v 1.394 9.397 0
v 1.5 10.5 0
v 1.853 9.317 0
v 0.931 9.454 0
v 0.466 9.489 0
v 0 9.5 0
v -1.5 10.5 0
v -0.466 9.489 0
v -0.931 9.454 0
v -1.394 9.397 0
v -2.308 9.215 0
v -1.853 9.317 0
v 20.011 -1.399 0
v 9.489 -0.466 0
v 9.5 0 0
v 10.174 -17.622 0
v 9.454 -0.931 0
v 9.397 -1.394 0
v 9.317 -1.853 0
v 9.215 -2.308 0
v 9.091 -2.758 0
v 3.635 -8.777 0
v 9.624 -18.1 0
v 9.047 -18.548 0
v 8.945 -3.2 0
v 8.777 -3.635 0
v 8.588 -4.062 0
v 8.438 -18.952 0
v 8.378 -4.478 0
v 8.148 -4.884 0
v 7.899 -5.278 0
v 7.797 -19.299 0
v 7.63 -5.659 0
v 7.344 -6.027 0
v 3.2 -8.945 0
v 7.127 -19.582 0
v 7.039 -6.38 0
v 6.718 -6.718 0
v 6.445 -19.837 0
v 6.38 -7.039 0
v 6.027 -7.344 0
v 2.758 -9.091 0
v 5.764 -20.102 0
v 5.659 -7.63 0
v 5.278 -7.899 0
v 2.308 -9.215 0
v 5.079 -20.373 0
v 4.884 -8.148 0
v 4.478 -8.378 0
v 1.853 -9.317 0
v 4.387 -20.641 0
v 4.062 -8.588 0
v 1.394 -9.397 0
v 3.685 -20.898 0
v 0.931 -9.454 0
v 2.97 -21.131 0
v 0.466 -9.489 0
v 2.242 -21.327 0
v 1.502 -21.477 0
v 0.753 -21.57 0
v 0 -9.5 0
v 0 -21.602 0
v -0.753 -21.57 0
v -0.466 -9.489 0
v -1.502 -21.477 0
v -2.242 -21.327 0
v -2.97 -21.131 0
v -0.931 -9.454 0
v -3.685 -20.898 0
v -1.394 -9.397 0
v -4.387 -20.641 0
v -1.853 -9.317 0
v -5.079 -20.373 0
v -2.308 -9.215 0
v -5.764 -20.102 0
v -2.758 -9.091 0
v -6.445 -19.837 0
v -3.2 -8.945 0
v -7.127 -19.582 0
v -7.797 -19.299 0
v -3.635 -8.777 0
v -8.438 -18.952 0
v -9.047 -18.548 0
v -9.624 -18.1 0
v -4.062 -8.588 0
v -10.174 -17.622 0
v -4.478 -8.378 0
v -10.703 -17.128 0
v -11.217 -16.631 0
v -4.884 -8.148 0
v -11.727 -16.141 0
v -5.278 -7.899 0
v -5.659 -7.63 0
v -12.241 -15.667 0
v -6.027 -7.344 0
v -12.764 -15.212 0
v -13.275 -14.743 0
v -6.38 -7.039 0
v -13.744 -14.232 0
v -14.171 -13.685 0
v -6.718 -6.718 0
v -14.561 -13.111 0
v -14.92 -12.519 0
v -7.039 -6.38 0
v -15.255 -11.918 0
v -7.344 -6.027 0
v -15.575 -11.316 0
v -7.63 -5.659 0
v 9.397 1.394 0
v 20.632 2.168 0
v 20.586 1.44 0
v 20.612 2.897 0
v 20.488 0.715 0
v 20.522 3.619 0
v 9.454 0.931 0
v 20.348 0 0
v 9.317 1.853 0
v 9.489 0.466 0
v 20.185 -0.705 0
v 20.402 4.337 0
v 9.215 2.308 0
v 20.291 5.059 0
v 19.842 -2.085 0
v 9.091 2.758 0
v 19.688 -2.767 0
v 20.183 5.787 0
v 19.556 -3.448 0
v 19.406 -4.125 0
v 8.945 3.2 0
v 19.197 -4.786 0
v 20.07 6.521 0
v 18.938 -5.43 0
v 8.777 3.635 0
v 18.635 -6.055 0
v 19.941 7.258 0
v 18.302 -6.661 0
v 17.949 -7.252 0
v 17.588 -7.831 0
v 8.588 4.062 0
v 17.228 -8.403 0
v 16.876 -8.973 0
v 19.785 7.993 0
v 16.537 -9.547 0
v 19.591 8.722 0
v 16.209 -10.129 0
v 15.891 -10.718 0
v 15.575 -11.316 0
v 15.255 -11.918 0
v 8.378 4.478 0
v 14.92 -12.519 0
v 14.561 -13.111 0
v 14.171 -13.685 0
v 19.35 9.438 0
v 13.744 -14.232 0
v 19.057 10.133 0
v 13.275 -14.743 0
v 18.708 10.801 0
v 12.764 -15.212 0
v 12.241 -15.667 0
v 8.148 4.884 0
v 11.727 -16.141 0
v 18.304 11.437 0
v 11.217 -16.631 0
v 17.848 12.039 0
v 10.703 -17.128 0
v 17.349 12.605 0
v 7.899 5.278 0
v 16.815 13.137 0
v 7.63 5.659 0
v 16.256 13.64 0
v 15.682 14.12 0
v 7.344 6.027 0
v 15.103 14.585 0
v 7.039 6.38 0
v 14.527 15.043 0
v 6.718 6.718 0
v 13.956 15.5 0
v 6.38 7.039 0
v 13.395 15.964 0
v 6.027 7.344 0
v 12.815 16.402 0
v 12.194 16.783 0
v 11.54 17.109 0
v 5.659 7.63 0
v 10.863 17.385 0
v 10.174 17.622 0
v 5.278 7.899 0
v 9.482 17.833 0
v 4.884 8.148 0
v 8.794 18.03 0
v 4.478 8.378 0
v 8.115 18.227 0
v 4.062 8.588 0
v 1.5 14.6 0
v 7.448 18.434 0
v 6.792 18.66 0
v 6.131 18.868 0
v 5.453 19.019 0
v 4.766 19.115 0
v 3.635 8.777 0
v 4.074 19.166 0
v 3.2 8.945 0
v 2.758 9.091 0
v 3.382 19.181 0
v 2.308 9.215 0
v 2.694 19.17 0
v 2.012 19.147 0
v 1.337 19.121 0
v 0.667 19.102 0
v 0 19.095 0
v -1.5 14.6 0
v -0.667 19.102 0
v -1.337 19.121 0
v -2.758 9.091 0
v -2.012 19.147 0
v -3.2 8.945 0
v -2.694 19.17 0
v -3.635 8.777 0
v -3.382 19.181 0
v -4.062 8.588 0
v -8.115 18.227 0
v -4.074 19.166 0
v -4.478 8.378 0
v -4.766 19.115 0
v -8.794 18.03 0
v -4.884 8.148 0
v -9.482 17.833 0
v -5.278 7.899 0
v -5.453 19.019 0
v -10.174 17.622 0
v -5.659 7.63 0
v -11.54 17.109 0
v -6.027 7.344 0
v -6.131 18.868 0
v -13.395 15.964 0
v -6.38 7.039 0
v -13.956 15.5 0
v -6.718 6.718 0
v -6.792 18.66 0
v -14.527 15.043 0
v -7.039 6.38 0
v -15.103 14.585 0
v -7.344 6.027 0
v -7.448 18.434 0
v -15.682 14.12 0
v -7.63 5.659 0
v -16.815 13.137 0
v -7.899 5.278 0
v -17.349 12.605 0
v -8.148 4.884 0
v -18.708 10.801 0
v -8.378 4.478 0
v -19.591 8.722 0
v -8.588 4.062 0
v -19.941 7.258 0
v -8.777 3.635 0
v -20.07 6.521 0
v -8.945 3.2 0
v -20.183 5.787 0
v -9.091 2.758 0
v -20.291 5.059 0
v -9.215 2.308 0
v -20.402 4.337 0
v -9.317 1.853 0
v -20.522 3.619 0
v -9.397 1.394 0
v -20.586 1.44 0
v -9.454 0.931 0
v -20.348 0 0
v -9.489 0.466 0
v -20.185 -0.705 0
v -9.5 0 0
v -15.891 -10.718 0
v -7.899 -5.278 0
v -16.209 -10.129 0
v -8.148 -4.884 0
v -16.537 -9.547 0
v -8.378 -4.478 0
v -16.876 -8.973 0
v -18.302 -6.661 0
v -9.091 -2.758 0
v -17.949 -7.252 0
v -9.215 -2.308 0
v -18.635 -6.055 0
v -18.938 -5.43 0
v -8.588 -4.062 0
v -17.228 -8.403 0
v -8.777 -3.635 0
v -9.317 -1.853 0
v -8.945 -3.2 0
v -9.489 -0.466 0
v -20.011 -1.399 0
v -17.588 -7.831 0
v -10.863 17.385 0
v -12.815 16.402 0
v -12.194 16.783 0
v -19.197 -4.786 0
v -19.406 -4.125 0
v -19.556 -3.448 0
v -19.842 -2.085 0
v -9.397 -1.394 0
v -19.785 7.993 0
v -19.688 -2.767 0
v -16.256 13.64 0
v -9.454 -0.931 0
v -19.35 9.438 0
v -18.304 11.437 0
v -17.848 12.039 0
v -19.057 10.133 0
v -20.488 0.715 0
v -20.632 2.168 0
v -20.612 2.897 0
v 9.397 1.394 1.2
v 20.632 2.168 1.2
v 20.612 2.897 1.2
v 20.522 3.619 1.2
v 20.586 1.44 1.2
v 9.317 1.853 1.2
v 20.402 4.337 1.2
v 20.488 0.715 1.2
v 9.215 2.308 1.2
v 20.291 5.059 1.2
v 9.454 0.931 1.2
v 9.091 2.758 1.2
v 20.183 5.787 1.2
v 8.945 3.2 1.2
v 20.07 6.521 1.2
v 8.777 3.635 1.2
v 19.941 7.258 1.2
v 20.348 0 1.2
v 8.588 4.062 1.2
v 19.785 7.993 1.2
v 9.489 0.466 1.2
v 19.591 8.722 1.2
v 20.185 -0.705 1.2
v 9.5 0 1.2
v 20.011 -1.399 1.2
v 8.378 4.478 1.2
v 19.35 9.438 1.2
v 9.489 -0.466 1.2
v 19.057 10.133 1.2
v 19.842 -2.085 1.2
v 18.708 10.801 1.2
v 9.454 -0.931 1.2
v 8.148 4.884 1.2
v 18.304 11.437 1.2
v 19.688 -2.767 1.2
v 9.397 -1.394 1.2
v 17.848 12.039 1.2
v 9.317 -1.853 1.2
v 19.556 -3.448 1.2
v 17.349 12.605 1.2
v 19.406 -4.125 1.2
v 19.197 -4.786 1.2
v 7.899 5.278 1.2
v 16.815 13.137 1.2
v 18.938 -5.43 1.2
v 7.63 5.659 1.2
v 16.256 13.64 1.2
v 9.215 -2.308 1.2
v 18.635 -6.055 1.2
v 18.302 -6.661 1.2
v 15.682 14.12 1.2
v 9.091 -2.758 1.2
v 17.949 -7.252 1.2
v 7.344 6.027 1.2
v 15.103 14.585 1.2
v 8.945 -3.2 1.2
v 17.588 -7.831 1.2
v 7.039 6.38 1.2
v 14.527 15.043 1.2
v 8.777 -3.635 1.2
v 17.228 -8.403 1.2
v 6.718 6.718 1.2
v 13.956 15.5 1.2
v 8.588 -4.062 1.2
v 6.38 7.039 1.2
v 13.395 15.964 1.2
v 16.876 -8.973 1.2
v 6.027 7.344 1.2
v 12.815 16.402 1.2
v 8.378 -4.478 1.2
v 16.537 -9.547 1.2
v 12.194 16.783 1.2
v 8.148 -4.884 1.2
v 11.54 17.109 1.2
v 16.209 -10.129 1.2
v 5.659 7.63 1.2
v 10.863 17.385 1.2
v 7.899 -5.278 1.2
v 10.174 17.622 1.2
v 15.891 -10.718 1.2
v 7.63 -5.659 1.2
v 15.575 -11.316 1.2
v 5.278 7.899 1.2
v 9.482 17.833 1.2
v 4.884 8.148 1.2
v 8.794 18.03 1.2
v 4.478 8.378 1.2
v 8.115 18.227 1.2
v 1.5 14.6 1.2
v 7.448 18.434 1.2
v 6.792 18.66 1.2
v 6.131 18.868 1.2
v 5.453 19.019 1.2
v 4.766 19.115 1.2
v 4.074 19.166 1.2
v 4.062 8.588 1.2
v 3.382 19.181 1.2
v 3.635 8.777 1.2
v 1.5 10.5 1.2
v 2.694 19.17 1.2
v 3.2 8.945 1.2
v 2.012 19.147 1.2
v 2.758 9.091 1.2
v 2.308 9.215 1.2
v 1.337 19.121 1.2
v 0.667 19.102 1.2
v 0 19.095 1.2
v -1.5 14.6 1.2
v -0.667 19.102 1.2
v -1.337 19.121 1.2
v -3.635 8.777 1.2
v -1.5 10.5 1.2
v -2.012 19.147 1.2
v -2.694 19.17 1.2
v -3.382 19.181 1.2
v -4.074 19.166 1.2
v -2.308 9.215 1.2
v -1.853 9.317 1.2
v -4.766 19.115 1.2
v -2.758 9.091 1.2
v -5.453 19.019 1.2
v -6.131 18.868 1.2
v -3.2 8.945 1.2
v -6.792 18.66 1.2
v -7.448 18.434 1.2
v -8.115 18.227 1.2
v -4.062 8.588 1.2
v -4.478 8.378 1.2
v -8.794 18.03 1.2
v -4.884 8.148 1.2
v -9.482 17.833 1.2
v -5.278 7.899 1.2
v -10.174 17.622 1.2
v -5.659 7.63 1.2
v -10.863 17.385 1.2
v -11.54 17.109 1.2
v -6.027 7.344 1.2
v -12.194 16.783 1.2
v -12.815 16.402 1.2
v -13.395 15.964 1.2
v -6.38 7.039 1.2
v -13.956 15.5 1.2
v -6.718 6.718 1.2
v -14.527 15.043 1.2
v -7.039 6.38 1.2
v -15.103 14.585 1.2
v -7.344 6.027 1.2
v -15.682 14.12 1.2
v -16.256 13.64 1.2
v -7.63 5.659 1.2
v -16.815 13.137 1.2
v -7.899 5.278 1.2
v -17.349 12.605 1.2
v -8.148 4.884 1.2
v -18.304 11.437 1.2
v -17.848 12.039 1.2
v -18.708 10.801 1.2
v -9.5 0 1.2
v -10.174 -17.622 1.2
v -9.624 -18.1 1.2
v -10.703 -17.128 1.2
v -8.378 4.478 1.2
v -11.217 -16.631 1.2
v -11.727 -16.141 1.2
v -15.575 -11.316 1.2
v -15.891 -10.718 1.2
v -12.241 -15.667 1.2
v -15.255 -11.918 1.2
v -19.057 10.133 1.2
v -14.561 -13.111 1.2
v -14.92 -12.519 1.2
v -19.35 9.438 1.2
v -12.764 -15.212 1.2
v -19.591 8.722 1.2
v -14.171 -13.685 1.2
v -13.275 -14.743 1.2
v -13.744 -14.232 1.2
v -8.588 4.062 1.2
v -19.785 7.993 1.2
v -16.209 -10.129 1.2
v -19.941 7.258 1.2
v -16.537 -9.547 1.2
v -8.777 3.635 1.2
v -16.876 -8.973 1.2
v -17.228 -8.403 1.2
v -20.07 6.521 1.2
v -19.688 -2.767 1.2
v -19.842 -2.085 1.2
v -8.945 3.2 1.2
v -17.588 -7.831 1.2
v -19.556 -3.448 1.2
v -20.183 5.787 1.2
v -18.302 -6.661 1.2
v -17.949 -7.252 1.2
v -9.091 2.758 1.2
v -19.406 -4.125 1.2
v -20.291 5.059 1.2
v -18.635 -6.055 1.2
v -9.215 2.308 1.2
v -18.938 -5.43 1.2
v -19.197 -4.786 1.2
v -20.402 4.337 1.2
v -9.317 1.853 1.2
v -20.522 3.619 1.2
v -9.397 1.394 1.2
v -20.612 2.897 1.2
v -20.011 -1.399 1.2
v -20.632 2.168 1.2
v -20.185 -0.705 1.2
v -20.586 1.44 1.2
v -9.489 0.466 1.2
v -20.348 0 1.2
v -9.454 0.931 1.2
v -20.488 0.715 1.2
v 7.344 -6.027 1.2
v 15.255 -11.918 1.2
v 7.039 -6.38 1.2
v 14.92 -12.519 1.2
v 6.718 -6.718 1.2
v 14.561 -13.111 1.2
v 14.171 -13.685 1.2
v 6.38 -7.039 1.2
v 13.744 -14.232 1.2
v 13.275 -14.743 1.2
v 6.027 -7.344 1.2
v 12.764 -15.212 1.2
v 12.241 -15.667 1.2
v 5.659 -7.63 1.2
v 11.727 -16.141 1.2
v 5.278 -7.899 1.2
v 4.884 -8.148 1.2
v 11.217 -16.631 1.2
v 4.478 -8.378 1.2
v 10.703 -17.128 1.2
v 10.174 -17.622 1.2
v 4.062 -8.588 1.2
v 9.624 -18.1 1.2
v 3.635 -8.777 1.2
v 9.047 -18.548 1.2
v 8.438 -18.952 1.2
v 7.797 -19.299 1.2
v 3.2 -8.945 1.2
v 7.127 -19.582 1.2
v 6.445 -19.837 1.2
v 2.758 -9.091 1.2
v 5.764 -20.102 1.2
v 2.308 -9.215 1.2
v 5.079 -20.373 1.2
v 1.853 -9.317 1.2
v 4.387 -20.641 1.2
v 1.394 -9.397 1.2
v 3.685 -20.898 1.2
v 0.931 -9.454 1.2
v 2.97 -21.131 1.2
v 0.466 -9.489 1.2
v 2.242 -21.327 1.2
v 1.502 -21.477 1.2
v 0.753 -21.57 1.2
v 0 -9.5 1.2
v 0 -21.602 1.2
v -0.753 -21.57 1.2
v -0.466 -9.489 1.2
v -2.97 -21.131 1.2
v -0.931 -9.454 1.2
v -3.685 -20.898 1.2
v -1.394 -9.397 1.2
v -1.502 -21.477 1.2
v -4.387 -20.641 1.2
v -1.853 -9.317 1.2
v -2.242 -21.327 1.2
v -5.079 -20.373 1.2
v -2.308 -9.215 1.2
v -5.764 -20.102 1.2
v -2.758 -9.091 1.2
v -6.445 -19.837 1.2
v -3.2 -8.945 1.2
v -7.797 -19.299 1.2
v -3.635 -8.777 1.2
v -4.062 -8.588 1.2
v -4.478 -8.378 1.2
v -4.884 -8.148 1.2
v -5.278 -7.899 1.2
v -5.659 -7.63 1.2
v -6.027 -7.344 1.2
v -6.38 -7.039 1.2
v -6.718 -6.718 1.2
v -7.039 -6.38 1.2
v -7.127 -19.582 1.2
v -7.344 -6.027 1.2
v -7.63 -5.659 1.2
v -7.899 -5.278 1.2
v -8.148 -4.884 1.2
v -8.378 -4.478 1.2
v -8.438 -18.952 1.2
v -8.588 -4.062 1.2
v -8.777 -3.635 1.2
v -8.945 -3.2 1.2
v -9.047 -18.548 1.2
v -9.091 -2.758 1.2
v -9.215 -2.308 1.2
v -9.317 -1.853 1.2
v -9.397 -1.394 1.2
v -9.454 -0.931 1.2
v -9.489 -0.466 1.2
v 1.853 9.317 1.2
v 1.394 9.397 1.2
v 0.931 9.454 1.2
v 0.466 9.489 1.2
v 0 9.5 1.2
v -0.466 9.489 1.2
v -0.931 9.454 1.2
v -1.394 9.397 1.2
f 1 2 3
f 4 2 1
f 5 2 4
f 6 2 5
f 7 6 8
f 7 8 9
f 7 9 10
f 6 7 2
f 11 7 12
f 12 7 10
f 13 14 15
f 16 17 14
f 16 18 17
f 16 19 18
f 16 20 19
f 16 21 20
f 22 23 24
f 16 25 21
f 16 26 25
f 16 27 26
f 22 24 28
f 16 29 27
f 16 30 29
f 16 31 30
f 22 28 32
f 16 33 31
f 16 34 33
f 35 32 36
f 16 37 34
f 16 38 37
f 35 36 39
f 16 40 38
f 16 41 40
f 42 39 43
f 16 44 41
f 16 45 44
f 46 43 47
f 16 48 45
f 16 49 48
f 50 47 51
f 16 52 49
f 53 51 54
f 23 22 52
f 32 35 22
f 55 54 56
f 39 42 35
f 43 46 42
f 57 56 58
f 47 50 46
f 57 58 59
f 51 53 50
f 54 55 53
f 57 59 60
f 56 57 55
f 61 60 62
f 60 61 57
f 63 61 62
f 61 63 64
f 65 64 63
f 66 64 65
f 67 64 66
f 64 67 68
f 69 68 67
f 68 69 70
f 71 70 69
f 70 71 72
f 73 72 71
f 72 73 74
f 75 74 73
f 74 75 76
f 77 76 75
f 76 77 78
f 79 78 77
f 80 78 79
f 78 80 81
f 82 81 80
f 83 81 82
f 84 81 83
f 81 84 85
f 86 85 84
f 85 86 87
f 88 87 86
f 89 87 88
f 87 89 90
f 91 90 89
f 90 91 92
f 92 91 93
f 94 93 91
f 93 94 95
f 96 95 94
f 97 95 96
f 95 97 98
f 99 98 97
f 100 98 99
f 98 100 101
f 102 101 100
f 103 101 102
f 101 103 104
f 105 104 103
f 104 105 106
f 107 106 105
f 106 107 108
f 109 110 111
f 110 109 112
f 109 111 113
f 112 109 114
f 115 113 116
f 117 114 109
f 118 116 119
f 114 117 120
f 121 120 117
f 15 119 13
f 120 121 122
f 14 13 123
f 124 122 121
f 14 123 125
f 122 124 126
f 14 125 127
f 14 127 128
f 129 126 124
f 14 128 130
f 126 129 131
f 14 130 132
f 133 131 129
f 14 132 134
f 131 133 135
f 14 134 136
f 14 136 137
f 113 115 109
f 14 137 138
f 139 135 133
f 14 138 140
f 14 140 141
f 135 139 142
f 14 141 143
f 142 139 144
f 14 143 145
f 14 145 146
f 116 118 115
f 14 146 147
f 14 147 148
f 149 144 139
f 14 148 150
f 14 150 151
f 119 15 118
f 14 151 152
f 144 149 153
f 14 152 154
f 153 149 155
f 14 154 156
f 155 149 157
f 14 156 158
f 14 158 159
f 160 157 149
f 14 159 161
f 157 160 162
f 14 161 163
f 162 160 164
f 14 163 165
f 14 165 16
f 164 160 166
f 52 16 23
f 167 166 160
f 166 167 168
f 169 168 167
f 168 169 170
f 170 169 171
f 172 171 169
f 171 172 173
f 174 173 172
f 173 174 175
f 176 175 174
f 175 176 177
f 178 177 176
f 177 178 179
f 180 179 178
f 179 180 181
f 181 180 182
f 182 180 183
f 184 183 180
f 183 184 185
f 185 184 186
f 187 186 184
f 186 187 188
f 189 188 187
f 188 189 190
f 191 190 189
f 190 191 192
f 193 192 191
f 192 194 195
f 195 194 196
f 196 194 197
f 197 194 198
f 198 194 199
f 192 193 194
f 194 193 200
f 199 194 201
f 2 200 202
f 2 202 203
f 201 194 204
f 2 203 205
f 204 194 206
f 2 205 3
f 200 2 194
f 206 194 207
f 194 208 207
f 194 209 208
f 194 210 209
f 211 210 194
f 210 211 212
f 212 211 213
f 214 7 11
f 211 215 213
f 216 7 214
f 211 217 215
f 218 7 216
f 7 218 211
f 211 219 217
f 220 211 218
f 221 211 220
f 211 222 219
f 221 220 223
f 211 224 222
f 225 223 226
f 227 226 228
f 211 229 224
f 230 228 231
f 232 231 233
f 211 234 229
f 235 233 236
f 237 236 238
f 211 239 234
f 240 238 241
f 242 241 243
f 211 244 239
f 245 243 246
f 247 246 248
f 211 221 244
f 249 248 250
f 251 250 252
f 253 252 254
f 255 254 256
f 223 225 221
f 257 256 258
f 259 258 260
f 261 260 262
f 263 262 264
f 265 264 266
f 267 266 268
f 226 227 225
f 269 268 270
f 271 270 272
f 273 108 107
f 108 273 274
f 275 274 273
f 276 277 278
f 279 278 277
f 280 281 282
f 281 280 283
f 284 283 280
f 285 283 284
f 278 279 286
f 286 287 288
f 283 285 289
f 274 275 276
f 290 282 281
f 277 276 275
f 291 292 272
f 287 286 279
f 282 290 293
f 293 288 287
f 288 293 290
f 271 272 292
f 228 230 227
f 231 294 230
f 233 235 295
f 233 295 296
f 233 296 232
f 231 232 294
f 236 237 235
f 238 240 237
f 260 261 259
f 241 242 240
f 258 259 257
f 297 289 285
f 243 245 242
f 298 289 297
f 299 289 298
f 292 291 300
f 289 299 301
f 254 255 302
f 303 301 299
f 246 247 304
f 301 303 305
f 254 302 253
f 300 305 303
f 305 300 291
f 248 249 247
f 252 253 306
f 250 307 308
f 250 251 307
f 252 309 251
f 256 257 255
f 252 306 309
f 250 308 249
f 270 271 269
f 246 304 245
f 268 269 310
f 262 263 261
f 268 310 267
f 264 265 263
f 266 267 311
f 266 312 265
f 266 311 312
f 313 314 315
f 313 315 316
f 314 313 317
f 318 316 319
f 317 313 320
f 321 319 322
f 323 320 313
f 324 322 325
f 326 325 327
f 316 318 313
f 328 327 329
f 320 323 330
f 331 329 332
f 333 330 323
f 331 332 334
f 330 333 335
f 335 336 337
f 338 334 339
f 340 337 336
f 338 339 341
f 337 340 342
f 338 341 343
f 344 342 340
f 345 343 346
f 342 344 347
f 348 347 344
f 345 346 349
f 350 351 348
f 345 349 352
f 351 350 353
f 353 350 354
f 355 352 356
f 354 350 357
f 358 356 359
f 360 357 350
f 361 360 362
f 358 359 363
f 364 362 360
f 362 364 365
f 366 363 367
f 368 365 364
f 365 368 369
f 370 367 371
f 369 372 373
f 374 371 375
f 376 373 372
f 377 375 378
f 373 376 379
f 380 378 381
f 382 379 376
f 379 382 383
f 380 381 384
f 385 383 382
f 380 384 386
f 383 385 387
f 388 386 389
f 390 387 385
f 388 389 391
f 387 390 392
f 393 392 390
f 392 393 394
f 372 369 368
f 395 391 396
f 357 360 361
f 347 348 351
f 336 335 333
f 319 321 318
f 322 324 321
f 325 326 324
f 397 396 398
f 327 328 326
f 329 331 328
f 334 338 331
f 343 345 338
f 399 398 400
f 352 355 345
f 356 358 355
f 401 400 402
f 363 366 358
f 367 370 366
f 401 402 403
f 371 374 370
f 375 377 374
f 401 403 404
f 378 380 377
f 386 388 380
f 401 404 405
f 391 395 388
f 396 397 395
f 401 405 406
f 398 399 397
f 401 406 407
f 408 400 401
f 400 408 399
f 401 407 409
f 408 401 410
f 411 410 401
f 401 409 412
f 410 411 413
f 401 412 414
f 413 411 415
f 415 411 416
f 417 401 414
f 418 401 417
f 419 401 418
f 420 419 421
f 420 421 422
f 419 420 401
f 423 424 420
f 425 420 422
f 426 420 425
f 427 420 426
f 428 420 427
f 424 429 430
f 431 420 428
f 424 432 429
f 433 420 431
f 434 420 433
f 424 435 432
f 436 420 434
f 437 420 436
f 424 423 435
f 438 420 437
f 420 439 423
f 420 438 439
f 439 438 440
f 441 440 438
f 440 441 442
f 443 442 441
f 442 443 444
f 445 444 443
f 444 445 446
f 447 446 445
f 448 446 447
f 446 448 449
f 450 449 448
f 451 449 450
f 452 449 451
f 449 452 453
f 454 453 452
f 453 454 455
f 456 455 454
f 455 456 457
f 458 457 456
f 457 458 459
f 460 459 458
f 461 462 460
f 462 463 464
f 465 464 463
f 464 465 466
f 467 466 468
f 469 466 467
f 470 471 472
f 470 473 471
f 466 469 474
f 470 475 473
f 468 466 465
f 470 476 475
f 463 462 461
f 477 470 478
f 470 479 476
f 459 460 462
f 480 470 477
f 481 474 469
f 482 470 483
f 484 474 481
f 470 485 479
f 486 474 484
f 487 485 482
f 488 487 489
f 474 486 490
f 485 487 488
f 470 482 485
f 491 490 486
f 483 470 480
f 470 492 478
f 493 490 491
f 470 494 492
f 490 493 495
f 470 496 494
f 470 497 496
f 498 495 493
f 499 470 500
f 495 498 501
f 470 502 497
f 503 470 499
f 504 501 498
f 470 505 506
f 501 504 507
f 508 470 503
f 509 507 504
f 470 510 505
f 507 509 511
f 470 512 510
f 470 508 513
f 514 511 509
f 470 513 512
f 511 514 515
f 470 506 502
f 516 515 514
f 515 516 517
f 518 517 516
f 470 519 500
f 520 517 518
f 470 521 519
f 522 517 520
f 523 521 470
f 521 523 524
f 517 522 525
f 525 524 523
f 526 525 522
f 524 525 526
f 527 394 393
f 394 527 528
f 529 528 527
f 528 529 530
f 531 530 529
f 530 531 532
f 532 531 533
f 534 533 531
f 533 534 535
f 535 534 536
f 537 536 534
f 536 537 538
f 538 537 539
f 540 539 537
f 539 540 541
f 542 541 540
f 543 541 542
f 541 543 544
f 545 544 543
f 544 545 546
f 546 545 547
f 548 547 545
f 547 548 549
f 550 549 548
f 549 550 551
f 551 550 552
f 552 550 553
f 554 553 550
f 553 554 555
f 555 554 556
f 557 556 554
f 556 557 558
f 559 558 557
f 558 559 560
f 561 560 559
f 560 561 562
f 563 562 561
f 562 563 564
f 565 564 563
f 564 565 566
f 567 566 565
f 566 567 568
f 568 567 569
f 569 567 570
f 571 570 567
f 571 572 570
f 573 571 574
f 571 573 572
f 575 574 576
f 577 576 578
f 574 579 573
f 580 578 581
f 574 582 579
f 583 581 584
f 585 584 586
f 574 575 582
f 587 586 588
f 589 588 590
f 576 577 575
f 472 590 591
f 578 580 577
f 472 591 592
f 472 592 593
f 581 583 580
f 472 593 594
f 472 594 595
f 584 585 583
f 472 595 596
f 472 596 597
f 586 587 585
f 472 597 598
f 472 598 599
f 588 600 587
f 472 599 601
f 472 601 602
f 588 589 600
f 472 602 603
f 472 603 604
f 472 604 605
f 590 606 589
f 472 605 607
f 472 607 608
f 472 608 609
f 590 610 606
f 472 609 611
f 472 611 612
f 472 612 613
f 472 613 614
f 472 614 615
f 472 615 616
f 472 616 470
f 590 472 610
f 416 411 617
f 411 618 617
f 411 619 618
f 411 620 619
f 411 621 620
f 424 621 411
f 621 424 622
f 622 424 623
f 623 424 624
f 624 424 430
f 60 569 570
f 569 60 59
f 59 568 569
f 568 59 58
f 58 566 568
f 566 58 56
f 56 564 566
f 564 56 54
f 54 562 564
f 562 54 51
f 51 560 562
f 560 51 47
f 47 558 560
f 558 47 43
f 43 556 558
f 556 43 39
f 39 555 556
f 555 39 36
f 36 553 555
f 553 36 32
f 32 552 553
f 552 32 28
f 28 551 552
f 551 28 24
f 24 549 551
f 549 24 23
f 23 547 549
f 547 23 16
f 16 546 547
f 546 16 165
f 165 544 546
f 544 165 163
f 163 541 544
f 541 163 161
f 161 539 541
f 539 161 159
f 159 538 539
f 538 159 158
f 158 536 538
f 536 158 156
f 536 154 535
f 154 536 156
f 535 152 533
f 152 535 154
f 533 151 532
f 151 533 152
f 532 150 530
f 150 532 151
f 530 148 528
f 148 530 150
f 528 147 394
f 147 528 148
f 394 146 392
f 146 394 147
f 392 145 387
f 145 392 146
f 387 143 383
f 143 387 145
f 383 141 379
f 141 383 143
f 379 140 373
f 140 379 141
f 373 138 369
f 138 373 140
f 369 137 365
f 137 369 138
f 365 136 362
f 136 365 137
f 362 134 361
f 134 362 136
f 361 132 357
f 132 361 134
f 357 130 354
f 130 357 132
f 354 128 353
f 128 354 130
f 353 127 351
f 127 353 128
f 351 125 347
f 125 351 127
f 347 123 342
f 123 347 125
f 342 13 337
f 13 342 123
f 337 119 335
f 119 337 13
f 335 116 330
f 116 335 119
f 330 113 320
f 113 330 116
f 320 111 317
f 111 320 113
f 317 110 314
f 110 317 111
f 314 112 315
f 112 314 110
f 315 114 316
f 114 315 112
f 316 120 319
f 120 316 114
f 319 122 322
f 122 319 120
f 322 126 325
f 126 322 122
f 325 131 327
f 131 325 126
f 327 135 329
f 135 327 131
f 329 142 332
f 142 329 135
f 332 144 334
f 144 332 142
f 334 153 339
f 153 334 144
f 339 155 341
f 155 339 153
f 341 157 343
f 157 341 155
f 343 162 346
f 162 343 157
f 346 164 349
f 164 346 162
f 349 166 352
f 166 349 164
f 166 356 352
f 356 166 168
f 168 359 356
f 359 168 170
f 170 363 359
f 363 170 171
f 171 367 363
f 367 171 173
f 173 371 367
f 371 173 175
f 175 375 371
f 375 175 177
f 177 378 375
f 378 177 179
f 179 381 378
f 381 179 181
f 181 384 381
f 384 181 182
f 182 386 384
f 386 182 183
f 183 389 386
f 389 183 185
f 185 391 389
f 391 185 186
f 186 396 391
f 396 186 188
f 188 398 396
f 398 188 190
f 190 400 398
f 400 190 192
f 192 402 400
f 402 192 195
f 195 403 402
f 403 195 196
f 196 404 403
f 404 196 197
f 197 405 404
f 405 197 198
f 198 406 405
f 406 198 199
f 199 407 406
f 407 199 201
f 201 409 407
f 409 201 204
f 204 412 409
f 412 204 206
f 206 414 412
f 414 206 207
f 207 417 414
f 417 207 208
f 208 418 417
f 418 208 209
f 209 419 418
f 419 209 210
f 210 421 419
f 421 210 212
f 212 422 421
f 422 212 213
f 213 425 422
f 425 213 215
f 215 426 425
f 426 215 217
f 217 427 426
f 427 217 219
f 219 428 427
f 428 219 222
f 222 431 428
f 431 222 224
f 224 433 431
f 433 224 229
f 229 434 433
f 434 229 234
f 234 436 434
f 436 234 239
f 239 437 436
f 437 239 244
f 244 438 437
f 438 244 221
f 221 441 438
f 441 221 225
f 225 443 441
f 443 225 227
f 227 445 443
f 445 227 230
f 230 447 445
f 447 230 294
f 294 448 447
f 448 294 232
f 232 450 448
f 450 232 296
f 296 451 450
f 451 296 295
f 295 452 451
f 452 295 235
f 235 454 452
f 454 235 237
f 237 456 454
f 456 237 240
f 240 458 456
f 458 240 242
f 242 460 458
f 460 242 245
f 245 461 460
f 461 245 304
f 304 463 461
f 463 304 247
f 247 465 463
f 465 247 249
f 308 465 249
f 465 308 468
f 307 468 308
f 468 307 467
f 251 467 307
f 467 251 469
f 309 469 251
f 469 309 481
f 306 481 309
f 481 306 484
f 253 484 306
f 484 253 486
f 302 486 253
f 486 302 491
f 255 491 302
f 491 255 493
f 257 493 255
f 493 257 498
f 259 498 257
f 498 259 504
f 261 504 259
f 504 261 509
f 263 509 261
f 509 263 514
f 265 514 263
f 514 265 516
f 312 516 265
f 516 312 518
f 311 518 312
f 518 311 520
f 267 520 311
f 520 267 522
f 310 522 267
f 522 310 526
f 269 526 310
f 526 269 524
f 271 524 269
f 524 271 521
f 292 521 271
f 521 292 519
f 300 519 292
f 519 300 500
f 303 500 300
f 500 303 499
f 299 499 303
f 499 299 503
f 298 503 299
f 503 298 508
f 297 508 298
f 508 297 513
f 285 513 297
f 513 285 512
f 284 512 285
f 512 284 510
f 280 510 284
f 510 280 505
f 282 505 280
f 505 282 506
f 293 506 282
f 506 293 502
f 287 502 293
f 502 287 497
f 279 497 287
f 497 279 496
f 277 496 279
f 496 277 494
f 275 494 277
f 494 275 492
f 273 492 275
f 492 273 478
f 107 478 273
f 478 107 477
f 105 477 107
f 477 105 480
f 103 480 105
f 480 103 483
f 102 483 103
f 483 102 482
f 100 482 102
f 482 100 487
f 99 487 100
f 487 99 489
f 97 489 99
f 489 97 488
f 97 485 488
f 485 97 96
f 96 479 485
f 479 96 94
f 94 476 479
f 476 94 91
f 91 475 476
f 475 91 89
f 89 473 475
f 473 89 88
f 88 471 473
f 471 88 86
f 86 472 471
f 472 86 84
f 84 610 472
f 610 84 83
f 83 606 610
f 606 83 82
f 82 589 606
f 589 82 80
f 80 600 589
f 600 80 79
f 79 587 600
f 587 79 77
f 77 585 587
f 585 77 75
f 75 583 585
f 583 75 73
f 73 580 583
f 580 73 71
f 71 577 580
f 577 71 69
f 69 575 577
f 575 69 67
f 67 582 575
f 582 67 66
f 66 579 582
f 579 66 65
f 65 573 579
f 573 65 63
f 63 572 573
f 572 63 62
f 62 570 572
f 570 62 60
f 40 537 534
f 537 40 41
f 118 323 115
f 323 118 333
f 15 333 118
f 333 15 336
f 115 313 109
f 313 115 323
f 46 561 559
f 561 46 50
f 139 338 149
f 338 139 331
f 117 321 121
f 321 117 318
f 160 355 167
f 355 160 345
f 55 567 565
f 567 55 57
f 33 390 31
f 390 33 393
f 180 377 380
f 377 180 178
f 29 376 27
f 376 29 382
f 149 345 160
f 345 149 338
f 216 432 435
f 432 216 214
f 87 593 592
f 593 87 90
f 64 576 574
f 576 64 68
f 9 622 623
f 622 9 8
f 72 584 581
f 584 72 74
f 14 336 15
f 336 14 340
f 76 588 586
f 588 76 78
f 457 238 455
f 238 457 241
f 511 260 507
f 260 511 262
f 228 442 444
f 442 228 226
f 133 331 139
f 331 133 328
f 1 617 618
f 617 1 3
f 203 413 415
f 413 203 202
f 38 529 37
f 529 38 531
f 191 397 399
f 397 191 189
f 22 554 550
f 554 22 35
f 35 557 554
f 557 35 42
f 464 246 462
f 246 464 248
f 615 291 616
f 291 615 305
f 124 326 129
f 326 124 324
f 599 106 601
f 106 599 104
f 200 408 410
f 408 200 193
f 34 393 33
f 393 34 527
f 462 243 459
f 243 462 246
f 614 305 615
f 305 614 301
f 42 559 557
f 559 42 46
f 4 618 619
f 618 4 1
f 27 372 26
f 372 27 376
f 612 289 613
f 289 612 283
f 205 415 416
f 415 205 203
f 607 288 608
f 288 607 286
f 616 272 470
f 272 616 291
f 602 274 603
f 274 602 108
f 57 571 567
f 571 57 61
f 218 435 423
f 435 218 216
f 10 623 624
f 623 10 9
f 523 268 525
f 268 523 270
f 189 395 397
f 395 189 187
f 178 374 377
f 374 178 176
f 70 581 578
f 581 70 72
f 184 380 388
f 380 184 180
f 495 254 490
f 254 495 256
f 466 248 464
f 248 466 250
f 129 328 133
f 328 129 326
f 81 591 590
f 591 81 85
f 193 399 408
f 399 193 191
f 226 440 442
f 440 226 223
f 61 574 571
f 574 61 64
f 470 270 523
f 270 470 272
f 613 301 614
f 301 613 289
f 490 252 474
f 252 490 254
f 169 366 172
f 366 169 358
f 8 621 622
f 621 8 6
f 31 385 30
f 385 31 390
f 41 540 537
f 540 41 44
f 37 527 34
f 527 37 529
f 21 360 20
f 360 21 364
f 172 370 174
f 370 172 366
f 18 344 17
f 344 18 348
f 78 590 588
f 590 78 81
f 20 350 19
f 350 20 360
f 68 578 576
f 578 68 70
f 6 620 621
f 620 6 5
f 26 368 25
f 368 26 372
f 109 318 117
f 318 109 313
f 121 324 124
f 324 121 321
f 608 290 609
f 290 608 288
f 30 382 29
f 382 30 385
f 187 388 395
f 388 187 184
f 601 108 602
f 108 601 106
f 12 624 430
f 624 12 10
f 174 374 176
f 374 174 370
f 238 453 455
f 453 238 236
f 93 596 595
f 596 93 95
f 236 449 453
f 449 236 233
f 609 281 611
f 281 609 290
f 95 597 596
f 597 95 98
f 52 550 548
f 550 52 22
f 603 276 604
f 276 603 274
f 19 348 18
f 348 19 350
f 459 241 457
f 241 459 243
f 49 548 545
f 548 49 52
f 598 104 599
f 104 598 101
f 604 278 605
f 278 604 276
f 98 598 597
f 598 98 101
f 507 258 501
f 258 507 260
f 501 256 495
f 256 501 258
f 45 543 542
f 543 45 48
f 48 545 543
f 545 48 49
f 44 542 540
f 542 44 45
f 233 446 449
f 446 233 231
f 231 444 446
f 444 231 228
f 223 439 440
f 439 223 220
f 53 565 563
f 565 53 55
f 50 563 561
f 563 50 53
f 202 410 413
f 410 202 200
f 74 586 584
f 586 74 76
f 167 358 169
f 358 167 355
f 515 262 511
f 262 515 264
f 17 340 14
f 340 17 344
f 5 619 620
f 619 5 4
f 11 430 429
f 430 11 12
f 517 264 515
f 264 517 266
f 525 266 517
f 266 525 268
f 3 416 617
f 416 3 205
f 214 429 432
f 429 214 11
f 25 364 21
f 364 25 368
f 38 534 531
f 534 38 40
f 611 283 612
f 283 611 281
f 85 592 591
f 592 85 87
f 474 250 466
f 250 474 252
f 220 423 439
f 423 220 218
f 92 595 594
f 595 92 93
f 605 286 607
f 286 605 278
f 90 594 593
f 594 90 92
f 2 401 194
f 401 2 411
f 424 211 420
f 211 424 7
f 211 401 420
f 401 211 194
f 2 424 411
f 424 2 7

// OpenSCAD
/*
  Elna Supermatic cam 01
  Name: Elastic multi-step
  Status: candidate

  Generated from measured parametric base v2.
  Surface mode: smooth
*/

include <_elna_measured_common.scad>;

profile_points = [
        [0.0000, 19.0950],
        [0.6671, 19.1020],
        [1.3371, 19.1212],
        [2.0124, 19.1468],
        [2.6942, 19.1702],
        [3.3821, 19.1806],
        [4.0739, 19.1662],
        [4.7660, 19.1155],
        [5.4535, 19.0187],
        [6.1307, 18.8683],
        [6.7918, 18.6604],
        [7.4479, 18.4343],
        [8.1151, 18.2268],
        [8.7938, 18.0300],
        [9.4819, 17.8328],
        [10.1742, 17.6223],
        [10.8634, 17.3850],
        [11.5400, 17.1087],
        [12.1938, 16.7833],
        [12.8150, 16.4024],
        [13.3951, 15.9636],
        [13.9565, 15.5003],
        [14.5266, 15.0427],
        [15.1034, 14.5852],
        [15.6823, 14.1204],
        [16.2558, 13.6403],
        [16.8149, 13.1372],
        [17.3492, 12.6049],
        [17.8485, 12.0389],
        [18.3037, 11.4374],
        [18.7079, 10.8010],
        [19.0569, 10.1328],
        [19.3503, 9.4378],
        [19.5907, 8.7224],
        [19.7846, 7.9935],
        [19.9407, 7.2578],
        [20.0698, 6.5211],
        [20.1829, 5.7874],
        [20.2907, 5.0590],
        [20.4019, 4.3366],
        [20.5224, 3.6187],
        [20.6124, 2.8969],
        [20.6317, 2.1685],
        [20.5865, 1.4396],
        [20.4876, 0.7154],
        [20.3485, 0.0000],
        [20.1846, -0.7049],
        [20.0113, -1.3993],
        [19.8424, -2.0855],
        [19.6885, -2.7670],
        [19.5563, -3.4483],
        [19.4058, -4.1248],
        [19.1974, -4.7865],
        [18.9376, -5.4303],
        [18.6354, -6.0550],
        [18.3019, -6.6614],
        [17.9490, -7.2519],
        [17.5878, -7.8306],
        [17.2280, -8.4026],
        [16.8764, -8.9733],
        [16.5368, -9.5475],
        [16.2093, -10.1287],
        [15.8909, -10.7185],
        [15.5754, -11.3162],
        [15.2548, -11.9184],
        [14.9199, -12.5193],
        [14.5615, -13.1112],
        [14.1715, -13.6853],
        [13.7439, -14.2322],
        [13.2751, -14.7435],
        [12.7645, -15.2121],
        [12.2406, -15.6672],
        [11.7273, -16.1412],
        [11.2175, -16.6307],
        [10.7027, -17.1280],
        [10.1742, -17.6223],
        [9.6242, -18.1005],
        [9.0466, -18.5482],
        [8.4379, -18.9518],
        [7.7974, -19.2993],
        [7.1274, -19.5823],
        [6.4454, -19.8368],
        [5.7641, -20.1018],
        [5.0795, -20.3726],
        [4.3875, -20.6415],
        [3.6849, -20.8981],
        [2.9697, -21.1307],
        [2.2416, -21.3273],
        [1.5018, -21.4767],
        [0.7532, -21.5702],
        [0.0000, -21.6020],
        [-0.7532, -21.5702],
        [-1.5018, -21.4767],
        [-2.2416, -21.3273],
        [-2.9697, -21.1307],
        [-3.6849, -20.8981],
        [-4.3875, -20.6415],
        [-5.0795, -20.3726],
        [-5.7641, -20.1018],
        [-6.4454, -19.8368],
        [-7.1274, -19.5823],
        [-7.7974, -19.2993],
        [-8.4379, -18.9518],
        [-9.0466, -18.5482],
        [-9.6242, -18.1005],
        [-10.1743, -17.6223],
        [-10.7027, -17.1280],
        [-11.2175, -16.6307],
        [-11.7273, -16.1412],
        [-12.2406, -15.6672],
        [-12.7645, -15.2121],
        [-13.2751, -14.7435],
        [-13.7439, -14.2322],
        [-14.1715, -13.6853],
        [-14.5615, -13.1112],
        [-14.9199, -12.5193],
        [-15.2548, -11.9184],
        [-15.5754, -11.3162],
        [-15.8909, -10.7185],
        [-16.2093, -10.1287],
        [-16.5368, -9.5475],
        [-16.8764, -8.9733],
        [-17.2280, -8.4026],
        [-17.5878, -7.8306],
        [-17.9490, -7.2519],
        [-18.3019, -6.6614],
        [-18.6354, -6.0550],
        [-18.9376, -5.4303],
        [-19.1974, -4.7865],
        [-19.4058, -4.1248],
        [-19.5563, -3.4483],
        [-19.6885, -2.7670],
        [-19.8424, -2.0855],
        [-20.0113, -1.3993],
        [-20.1846, -0.7049],
        [-20.3485, -0.0000],
        [-20.4876, 0.7154],
        [-20.5865, 1.4396],
        [-20.6317, 2.1685],
        [-20.6124, 2.8969],
        [-20.5224, 3.6187],
        [-20.4019, 4.3366],
        [-20.2907, 5.0590],
        [-20.1829, 5.7874],
        [-20.0698, 6.5211],
        [-19.9407, 7.2578],
        [-19.7846, 7.9935],
        [-19.5907, 8.7224],
        [-19.3503, 9.4378],
        [-19.0569, 10.1328],
        [-18.7079, 10.8010],
        [-18.3037, 11.4374],
        [-17.8485, 12.0389],
        [-17.3492, 12.6049],
        [-16.8149, 13.1372],
        [-16.2558, 13.6403],
        [-15.6823, 14.1204],
        [-15.1034, 14.5852],
        [-14.5266, 15.0427],
        [-13.9565, 15.5003],
        [-13.3951, 15.9636],
        [-12.8150, 16.4024],
        [-12.1938, 16.7833],
        [-11.5400, 17.1087],
        [-10.8634, 17.3850],
        [-10.1743, 17.6223],
        [-9.4819, 17.8328],
        [-8.7938, 18.0300],
        [-8.1151, 18.2268],
        [-7.4479, 18.4343],
        [-6.7918, 18.6604],
        [-6.1307, 18.8683],
        [-5.4535, 19.0187],
        [-4.7660, 19.1155],
        [-4.0739, 19.1662],
        [-3.3821, 19.1806],
        [-2.6942, 19.1702],
        [-2.0124, 19.1468],
        [-1.3371, 19.1212],
        [-0.6671, 19.1020]
];

icon_points = [[-1.000,0.180], [-0.820,0.180], [-0.820,0.360], [-0.640,0.360], [-0.640,0.560], [-0.460,0.560], [-0.460,0.740], [-0.280,0.740], [-0.280,0.560], [-0.100,0.560], [-0.100,0.360], [0.080,0.360], [0.080,0.180], [0.260,0.180], [0.260,0.360], [0.440,0.360], [0.440,0.560], [0.620,0.560], [0.620,0.740], [0.800,0.740], [1.000,0.740]];

elna_cam_ring(profile_points=profile_points);
